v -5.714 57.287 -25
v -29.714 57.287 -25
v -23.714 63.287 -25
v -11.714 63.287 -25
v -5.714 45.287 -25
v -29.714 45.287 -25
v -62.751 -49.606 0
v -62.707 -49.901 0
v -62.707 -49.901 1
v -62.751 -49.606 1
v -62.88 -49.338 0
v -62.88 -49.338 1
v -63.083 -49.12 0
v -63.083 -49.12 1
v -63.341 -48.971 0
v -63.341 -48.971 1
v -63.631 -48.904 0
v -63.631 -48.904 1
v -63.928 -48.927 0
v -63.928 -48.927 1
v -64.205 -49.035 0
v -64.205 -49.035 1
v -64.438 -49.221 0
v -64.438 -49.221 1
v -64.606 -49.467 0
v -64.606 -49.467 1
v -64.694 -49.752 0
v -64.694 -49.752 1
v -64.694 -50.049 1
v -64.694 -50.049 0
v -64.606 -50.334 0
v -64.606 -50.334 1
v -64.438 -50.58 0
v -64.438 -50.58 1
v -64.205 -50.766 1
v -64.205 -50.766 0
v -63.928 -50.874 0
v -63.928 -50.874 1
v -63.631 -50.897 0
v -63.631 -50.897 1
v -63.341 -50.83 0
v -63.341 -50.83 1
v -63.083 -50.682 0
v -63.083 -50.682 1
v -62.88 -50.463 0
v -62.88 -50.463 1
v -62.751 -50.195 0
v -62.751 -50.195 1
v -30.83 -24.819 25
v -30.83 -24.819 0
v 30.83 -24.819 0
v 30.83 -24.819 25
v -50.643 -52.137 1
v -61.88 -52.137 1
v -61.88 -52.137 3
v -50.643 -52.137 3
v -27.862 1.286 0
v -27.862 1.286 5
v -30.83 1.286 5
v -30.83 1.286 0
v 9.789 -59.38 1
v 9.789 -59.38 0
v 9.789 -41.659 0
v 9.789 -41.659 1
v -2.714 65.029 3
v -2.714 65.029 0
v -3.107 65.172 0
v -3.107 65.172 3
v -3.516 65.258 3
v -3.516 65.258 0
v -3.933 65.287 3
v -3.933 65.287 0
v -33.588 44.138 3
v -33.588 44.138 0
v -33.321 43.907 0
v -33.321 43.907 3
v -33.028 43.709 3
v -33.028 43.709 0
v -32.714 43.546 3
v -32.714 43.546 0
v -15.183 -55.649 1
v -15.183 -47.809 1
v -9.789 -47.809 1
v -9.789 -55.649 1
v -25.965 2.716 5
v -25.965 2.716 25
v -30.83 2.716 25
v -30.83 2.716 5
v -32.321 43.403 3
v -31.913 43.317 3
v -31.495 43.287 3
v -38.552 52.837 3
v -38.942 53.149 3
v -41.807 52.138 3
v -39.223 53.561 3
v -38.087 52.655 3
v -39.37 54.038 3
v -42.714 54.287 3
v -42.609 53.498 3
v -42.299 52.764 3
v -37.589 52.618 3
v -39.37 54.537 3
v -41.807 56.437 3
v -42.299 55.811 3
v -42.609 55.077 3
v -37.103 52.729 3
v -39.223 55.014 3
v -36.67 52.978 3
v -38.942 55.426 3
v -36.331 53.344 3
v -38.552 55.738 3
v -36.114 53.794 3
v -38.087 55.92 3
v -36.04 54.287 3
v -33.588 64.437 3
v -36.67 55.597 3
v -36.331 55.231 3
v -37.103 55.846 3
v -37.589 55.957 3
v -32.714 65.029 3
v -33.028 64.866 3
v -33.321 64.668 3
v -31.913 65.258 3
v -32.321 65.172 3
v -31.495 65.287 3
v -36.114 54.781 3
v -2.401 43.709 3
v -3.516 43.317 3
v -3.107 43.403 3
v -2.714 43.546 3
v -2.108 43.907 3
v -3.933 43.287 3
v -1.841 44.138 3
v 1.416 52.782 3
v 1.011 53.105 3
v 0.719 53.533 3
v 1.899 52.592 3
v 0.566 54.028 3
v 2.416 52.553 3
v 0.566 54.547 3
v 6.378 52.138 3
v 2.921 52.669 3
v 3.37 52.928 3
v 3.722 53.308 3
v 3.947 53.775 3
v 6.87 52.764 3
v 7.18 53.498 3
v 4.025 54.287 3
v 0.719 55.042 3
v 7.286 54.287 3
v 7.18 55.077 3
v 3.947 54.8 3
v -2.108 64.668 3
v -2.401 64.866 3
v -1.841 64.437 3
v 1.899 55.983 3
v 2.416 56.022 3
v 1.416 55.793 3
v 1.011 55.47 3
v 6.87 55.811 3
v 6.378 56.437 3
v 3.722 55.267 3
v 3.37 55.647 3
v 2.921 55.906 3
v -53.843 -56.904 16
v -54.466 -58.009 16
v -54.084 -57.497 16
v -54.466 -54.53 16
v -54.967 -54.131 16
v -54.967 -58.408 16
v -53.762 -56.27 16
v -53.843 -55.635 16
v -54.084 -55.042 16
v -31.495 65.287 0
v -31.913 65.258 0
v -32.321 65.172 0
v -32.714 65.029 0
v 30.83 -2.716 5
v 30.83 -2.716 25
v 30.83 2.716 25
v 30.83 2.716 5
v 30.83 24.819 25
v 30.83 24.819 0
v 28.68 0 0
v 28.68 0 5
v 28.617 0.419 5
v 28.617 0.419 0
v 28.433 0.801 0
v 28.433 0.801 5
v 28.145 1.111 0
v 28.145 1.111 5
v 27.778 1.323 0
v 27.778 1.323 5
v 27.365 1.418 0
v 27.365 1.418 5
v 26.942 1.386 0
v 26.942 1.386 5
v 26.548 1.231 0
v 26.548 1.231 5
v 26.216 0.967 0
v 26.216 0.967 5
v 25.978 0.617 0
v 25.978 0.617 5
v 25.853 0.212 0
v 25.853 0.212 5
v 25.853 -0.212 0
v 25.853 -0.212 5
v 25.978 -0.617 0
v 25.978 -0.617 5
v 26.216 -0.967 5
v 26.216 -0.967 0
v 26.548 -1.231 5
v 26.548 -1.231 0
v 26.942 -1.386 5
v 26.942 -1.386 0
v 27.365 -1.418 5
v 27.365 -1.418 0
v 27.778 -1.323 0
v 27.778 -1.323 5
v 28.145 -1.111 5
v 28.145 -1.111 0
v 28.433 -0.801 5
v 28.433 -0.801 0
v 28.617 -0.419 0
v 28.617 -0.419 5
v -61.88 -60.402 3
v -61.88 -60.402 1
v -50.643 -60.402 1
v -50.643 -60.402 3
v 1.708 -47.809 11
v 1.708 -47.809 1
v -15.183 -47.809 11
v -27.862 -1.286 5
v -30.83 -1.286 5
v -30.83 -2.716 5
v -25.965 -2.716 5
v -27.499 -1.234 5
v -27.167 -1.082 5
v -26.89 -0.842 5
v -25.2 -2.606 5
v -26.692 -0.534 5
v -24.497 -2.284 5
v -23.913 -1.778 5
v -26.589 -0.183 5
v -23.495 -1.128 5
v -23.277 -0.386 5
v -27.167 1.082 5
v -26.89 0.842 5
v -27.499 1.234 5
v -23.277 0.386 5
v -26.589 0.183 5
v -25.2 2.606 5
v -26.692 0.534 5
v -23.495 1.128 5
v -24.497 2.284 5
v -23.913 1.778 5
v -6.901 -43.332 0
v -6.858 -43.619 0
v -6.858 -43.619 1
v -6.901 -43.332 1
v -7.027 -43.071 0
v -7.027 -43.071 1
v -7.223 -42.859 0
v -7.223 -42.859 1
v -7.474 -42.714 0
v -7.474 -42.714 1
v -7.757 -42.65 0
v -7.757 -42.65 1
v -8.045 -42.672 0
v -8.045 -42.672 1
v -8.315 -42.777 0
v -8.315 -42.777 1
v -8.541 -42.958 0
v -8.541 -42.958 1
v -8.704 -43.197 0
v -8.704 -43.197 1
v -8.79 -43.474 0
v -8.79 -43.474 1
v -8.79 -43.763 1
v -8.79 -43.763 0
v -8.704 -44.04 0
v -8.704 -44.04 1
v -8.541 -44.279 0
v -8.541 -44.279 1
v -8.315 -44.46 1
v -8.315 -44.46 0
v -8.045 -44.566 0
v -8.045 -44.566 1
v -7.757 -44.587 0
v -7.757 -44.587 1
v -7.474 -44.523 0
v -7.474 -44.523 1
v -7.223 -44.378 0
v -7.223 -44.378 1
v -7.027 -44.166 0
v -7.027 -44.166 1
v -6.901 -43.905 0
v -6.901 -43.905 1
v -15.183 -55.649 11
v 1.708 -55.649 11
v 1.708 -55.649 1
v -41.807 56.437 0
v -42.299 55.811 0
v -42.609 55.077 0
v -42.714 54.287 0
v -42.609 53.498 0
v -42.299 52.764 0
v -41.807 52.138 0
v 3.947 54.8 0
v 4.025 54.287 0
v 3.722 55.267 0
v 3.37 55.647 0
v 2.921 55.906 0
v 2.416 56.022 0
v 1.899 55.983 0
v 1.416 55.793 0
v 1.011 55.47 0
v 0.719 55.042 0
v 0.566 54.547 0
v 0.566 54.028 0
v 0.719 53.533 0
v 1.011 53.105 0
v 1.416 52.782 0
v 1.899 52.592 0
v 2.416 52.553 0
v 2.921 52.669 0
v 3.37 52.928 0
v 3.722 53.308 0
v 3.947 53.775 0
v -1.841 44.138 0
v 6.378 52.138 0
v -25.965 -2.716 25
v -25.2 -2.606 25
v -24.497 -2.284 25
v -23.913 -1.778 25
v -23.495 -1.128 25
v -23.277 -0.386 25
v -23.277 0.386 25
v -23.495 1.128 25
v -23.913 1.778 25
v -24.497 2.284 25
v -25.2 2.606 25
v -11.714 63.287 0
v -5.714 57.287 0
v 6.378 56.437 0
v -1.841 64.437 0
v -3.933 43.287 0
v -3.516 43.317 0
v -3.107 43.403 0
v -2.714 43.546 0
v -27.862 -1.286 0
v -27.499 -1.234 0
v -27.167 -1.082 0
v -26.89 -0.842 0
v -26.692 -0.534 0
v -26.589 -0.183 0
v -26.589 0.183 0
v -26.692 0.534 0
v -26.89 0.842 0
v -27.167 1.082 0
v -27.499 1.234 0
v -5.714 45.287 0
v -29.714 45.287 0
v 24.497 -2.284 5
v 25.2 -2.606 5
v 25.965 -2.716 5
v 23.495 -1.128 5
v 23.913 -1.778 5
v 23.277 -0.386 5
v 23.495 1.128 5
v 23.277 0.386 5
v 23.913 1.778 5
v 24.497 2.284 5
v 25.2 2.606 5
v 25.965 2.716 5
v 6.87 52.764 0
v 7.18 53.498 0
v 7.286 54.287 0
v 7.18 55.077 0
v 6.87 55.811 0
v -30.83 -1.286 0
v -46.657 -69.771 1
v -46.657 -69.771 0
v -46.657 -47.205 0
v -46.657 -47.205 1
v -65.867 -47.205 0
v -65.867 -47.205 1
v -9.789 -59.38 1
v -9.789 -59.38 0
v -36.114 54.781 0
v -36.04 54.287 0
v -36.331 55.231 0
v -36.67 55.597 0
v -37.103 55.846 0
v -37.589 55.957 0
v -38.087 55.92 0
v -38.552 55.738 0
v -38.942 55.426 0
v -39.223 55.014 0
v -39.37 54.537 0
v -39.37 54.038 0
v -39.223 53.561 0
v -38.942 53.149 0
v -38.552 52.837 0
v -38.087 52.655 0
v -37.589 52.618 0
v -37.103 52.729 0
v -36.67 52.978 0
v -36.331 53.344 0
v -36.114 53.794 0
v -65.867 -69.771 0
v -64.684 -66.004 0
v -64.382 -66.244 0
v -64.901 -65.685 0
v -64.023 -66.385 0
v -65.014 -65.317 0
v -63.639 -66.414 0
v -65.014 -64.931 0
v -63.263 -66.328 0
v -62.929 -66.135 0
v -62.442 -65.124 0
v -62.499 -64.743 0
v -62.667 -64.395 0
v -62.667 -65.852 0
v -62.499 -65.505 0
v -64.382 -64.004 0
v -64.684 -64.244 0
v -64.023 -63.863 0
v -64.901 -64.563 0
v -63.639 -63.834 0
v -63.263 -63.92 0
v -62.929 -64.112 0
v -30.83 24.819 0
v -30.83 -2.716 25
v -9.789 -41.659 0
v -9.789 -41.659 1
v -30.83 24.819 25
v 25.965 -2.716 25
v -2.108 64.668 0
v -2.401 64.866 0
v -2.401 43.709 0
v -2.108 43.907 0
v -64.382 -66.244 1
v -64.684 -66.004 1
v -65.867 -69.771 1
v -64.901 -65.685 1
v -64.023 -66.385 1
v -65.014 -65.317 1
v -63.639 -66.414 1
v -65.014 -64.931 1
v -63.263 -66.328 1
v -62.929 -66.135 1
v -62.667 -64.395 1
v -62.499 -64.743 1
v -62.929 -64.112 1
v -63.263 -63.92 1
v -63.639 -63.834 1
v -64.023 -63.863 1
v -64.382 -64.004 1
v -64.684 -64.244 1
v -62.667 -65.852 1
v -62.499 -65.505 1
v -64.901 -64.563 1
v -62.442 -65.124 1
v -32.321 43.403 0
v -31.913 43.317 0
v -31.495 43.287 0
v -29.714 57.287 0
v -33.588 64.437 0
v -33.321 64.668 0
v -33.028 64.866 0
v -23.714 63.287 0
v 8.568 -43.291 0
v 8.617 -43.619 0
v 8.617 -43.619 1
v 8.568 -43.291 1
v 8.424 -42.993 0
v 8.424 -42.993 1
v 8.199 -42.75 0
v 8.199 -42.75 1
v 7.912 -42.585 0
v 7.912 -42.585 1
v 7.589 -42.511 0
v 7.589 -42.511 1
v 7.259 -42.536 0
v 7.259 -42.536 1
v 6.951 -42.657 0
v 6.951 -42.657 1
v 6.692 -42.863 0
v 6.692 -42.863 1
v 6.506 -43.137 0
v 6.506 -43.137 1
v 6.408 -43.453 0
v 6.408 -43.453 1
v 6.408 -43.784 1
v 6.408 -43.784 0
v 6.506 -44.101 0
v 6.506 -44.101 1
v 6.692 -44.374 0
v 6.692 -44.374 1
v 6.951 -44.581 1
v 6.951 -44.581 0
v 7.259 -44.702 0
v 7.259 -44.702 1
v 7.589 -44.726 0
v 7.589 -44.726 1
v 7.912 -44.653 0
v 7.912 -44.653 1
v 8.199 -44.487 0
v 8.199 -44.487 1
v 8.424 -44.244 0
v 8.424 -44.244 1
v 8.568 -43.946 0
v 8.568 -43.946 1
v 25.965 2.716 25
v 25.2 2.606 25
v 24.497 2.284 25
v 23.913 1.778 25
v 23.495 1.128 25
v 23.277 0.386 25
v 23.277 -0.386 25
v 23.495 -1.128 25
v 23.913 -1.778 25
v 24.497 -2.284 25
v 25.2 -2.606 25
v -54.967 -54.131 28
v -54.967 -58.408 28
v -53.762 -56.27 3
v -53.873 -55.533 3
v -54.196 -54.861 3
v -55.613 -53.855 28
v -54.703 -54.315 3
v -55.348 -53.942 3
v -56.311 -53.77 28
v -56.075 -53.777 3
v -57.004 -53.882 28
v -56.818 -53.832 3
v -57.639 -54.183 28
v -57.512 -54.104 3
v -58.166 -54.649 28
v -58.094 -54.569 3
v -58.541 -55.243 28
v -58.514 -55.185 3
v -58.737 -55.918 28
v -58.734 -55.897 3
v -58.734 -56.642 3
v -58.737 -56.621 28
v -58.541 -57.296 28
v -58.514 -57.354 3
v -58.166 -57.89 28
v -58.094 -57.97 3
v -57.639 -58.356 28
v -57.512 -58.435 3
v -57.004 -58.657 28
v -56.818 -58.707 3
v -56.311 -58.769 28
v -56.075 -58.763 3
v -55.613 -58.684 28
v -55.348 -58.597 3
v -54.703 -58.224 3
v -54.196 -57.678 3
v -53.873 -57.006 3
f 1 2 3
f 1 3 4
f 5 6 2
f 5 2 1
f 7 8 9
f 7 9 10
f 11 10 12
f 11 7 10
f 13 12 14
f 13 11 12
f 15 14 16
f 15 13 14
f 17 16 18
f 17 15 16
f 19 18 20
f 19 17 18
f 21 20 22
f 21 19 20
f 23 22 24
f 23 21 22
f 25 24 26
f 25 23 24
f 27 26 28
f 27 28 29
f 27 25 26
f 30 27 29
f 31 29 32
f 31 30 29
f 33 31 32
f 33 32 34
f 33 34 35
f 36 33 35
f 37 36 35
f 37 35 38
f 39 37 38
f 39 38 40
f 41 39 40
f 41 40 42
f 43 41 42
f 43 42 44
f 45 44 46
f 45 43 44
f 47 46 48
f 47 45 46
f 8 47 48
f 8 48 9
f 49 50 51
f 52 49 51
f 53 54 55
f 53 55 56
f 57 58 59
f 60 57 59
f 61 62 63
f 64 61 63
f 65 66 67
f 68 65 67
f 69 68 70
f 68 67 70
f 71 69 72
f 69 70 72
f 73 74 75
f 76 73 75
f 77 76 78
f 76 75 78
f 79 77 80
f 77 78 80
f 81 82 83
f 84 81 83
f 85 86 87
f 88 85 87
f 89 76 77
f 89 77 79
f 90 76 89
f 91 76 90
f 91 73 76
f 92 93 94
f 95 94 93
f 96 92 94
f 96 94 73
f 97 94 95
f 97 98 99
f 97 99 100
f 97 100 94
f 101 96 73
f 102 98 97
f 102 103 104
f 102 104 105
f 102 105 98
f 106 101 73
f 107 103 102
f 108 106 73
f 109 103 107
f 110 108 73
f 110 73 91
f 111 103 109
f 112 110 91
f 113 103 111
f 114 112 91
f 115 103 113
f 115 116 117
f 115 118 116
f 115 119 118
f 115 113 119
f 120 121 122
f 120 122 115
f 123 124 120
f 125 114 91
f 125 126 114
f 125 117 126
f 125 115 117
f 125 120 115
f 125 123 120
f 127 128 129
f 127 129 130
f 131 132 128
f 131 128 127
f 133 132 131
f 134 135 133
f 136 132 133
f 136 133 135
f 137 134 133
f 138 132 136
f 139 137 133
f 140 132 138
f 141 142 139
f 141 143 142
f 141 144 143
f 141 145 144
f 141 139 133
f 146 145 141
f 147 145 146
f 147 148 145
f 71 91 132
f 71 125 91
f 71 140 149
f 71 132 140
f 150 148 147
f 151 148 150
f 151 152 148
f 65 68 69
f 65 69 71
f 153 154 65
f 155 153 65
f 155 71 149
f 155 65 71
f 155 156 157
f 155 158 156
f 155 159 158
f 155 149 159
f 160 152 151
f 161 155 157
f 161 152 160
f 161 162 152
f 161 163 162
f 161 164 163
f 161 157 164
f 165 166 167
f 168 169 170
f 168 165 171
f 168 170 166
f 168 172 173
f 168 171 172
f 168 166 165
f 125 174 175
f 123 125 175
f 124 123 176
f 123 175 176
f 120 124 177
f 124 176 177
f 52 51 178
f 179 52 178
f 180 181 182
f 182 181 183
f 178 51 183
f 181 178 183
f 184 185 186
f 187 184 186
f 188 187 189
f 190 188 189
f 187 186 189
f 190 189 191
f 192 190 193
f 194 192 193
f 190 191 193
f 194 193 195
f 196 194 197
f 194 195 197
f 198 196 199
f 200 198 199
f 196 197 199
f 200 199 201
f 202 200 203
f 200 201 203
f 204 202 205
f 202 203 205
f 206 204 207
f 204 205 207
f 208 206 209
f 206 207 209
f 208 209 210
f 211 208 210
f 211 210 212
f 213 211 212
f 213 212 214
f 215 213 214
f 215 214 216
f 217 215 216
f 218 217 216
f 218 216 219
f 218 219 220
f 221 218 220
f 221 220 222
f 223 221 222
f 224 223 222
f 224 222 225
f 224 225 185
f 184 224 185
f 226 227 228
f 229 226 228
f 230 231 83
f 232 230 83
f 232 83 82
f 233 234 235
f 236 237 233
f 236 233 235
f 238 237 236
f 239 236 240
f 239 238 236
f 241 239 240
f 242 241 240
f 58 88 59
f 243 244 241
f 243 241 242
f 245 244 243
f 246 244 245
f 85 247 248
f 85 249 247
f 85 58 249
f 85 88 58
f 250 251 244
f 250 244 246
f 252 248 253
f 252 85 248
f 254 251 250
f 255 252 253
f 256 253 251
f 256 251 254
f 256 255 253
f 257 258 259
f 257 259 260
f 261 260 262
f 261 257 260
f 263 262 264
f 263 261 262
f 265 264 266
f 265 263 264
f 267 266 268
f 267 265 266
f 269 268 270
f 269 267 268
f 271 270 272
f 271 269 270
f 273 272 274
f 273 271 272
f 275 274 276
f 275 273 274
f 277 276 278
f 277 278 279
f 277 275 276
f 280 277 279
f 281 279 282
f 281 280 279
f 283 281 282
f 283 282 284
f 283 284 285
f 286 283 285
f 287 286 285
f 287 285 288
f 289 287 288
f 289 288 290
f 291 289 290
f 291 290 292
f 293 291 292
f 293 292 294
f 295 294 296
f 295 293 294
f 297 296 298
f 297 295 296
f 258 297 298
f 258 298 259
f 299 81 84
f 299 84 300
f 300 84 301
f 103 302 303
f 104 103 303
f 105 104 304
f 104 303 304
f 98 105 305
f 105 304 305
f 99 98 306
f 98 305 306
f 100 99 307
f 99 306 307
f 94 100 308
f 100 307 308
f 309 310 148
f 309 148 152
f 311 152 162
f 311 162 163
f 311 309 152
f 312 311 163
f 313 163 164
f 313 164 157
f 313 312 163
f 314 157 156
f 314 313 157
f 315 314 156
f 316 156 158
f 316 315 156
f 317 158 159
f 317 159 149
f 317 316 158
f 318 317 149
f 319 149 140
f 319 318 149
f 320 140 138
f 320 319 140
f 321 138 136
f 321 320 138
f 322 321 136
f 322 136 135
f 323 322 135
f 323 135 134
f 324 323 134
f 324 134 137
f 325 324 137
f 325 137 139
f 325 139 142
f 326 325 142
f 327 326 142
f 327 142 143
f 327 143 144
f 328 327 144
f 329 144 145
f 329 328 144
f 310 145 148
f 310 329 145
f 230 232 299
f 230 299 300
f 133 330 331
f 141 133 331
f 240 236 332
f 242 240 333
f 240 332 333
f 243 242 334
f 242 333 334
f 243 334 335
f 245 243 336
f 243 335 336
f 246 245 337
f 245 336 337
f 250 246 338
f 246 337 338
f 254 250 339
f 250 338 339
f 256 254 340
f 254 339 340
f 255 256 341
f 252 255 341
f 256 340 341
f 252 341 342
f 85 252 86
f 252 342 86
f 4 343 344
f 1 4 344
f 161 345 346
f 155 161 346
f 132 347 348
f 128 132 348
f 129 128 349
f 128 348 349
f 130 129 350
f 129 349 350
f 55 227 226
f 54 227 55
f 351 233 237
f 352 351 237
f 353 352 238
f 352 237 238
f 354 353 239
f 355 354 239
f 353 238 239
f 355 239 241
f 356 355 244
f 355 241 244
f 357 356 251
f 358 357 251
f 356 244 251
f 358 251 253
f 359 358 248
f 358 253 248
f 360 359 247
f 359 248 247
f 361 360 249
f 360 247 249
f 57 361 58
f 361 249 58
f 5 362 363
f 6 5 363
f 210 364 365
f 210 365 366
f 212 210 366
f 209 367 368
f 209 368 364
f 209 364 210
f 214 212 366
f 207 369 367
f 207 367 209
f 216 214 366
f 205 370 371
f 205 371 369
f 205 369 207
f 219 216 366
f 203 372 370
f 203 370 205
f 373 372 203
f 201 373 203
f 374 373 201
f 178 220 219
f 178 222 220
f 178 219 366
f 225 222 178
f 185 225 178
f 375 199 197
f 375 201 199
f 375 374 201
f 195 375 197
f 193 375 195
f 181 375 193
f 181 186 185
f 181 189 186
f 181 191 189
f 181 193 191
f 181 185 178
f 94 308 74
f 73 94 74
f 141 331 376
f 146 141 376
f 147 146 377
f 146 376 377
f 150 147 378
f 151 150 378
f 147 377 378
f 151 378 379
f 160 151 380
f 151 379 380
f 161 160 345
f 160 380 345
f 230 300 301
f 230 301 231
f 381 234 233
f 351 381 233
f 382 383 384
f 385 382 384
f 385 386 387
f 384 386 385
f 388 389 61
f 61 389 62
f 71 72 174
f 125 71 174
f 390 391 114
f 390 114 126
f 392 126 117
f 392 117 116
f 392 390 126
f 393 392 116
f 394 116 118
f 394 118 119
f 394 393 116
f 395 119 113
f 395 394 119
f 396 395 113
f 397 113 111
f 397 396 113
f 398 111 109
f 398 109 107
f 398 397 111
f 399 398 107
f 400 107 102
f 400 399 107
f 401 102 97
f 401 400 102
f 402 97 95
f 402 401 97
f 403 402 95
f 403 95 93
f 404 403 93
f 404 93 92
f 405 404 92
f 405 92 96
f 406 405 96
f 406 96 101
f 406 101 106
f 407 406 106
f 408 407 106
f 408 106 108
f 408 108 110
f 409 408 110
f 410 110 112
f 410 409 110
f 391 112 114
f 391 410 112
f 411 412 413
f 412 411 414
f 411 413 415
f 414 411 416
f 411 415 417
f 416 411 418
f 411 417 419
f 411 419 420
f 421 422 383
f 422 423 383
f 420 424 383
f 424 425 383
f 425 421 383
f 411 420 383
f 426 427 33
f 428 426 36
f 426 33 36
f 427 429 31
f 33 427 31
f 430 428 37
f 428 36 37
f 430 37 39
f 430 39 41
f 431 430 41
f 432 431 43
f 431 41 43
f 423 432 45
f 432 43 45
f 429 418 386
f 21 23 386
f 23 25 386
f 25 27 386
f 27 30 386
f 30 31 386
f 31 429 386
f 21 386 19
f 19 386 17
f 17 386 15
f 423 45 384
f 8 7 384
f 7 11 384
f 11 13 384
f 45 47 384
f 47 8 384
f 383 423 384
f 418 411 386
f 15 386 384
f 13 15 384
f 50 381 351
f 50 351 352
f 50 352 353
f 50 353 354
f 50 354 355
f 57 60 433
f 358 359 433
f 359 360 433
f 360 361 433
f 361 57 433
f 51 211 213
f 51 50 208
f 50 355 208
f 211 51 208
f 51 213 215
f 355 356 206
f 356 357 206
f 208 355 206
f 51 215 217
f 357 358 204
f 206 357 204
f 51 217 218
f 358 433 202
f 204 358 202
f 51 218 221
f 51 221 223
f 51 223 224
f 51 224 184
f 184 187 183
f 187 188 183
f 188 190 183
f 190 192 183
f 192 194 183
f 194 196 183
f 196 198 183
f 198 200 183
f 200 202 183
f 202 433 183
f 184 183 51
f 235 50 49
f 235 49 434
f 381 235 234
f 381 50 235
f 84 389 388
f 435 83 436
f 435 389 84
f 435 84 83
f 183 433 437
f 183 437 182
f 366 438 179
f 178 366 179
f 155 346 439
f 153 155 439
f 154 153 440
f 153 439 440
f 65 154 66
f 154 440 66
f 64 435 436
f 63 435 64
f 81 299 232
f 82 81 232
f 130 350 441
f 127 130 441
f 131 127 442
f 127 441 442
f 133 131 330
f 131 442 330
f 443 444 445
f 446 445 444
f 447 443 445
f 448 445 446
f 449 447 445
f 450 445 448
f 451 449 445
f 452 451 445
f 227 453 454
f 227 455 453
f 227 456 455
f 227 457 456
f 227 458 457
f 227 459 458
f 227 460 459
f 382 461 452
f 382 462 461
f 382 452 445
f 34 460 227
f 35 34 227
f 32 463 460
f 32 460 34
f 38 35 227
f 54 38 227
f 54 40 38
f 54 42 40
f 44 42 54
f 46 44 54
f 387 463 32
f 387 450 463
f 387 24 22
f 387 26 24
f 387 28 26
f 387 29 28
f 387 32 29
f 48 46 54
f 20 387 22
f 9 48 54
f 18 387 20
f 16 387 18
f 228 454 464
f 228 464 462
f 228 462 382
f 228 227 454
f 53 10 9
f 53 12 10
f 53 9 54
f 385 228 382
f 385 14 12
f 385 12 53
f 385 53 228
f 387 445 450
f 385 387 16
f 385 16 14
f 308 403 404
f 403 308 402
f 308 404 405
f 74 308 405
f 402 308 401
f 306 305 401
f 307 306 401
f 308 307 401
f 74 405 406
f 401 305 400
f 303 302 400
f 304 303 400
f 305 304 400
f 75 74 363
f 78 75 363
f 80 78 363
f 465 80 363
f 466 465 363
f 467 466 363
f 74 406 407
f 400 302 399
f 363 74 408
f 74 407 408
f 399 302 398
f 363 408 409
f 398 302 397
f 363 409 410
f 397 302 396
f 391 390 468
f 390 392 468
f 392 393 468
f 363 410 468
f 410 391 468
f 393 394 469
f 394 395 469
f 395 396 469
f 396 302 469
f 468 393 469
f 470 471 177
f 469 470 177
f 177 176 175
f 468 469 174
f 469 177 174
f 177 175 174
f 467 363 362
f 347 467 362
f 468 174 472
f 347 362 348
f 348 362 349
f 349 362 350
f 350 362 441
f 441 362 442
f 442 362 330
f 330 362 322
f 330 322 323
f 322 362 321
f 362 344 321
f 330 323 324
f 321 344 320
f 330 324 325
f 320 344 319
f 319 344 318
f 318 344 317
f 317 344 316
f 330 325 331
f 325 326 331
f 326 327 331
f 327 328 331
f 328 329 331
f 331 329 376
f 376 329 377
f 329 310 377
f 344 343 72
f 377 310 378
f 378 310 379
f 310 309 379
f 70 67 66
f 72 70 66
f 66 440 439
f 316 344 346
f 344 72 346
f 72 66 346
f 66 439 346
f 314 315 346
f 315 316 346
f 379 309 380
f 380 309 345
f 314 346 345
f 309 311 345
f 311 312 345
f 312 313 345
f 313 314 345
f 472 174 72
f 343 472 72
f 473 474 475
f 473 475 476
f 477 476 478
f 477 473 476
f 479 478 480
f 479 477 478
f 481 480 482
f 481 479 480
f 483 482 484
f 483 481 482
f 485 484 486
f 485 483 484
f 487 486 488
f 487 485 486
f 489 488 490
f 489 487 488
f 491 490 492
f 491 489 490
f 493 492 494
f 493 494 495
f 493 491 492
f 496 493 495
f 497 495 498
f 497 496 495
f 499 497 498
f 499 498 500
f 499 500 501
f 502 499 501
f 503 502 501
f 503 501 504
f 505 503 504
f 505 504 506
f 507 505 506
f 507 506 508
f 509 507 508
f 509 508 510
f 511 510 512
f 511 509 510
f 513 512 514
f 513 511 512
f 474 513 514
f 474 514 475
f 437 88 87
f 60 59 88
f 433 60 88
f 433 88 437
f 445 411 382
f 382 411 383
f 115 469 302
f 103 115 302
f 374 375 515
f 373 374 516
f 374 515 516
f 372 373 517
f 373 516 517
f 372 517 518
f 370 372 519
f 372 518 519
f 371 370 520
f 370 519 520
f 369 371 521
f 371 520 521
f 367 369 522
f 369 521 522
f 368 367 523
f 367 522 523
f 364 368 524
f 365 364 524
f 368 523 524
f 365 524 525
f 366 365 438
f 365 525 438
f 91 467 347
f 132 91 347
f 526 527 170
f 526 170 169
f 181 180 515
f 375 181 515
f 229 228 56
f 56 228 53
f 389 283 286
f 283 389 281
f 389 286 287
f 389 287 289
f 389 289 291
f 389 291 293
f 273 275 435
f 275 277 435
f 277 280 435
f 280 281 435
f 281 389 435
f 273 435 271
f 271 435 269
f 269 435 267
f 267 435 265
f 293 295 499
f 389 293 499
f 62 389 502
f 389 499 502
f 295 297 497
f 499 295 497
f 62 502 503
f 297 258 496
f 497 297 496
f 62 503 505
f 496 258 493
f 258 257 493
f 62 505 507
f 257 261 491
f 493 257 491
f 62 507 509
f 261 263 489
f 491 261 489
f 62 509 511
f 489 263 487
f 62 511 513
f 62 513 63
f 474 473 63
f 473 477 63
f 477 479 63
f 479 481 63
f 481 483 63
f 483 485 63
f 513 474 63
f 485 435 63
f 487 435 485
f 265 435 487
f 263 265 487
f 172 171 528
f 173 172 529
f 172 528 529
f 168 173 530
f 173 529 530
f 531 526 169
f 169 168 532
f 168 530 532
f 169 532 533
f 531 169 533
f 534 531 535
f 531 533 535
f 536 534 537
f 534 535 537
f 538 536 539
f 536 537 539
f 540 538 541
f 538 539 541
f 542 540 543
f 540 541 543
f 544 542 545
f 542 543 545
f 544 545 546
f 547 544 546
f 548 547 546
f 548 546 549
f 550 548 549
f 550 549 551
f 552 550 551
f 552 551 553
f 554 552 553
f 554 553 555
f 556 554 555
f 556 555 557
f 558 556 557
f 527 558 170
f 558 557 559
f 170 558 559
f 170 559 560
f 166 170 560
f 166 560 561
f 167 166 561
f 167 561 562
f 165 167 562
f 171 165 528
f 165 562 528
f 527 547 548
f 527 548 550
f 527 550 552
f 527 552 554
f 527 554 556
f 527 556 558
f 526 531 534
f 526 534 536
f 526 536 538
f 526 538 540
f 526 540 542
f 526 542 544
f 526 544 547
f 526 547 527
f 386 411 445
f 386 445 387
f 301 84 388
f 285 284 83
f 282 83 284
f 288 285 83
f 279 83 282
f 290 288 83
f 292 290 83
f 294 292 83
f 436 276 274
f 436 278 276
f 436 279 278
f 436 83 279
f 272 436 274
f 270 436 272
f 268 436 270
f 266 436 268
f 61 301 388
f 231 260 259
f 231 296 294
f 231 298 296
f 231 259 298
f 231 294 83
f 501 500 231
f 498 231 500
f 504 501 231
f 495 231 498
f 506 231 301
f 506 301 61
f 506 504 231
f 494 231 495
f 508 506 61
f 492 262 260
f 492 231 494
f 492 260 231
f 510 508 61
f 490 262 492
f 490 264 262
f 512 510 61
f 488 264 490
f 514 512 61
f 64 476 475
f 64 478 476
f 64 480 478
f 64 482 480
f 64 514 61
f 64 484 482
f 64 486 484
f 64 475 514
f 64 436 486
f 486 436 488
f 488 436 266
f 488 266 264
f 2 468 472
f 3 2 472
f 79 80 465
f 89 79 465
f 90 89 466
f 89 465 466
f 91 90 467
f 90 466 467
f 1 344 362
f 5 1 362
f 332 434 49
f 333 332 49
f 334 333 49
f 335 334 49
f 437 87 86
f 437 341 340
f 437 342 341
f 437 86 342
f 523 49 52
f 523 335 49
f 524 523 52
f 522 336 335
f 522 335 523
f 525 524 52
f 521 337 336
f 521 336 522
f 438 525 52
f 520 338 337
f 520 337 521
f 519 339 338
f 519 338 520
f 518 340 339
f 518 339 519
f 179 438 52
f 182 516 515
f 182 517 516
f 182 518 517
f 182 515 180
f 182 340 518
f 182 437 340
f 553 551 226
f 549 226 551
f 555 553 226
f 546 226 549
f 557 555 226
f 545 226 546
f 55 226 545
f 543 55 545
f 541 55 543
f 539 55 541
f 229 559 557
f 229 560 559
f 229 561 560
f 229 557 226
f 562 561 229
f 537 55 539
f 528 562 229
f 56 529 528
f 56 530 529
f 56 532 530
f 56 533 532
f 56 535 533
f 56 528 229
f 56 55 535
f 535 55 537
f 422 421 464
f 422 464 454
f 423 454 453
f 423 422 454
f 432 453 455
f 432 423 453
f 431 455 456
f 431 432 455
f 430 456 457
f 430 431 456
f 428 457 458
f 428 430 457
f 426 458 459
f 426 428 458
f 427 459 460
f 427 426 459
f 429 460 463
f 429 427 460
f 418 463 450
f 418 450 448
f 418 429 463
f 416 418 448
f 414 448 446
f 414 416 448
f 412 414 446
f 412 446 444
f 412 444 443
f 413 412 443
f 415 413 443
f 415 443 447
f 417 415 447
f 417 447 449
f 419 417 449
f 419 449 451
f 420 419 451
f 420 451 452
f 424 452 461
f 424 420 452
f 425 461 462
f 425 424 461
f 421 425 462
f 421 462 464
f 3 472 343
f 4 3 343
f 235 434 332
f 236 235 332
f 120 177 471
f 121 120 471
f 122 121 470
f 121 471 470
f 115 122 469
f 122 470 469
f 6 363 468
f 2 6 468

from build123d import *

# Parameters (mm, degrees)
F0_W      = 61.659202
F0_H      = 49.637978
F1_DEPTH  = 25
F3_DEPTH  = 20
F4_R      = 1.421649
F5_DEPTH  = 25
F6_W      = 19.577416
F6_H      = 17.721154
F6_R      = 0.971405
F6_R_2    = 1.110846
F7_DEPTH  = 1
F8_W      = 5.394709
F8_H      = 7.840492
F8_W_2    = 11.496354
F9_DEPTH  = 10
F10_W     = 19.209724
F10_H     = 22.565868
F10_R     = 1.29352
F10_R_2   = 0.998938
F11_DEPTH = 1
F12_W     = 11.237443
F12_H     = 8.265712
F13_DEPTH = 3
F14_R     = 2.5
F15_DEPTH = 25
F16_W     = 2.265696
F16_H     = 6.188683
F17_DEPTH = 12
F18_R     = 1.674399
F18_R_2   = 1.738958
F19_DEPTH = 3
F21_DEPTH = 25


with BuildPart() as f1:
    # F0 (on Top) → F1 (new body)
    with BuildSketch(Plane.XY):
        Rectangle(F0_W, F0_H)
    extrude(amount=F1_DEPTH)

    # F2 (on face) → F3 (cut)
    with BuildSketch(Plane.XY.offset(25)):
        with BuildLine():
            Line((-48.539023, -2.715533), (-25.964985, -2.715533))
            ThreePointArc((-25.964985, -2.715533), (-23.249452, 0), (-25.964985, 2.715533))
            Line((-25.964985, 2.715533), (-48.539023, 2.715533))
            Line((-48.539023, 2.715533), (-48.539023, -2.715533))
        make_face()
        with BuildLine():
            Line((48.539023, -2.715533), (48.539023, 2.715533))
            Line((48.539023, 2.715533), (25.964985, 2.715533))
            ThreePointArc((25.964985, 2.715533), (23.249452, 0), (25.964985, -2.715533))
            Line((25.964985, -2.715533), (48.539023, -2.715533))
        make_face()
    extrude(amount=-F3_DEPTH, mode=Mode.SUBTRACT)

    # F4 (on face) → F5 (cut)
    with BuildSketch(Plane.XY.offset(5)):
        with BuildLine():
            Line((-35.779416, -1.28587), (-27.861754, -1.28587))
            ThreePointArc((-27.861754, -1.28587), (-26.575883, 0), (-27.861754, 1.28587))
            Line((-27.861754, 1.28587), (-35.779416, 1.28587))
            Line((-35.779416, 1.28587), (-35.779416, -1.28587))
        make_face()
        with Locations((27.258597, 0)):
            Circle(F4_R)
    extrude(amount=-F5_DEPTH, mode=Mode.SUBTRACT)


with BuildPart() as f7:
    # F6 (on Top) → F7 (new body)
    with BuildSketch(Plane.XY):
        with Locations((0, -50.51963)):
            Rectangle(F6_W, F6_H)
        with Locations((-7.829157, -43.618601)):
            Circle(F6_R, mode=Mode.SUBTRACT)
        with Locations((7.506458, -43.618601)):
            Circle(F6_R_2, mode=Mode.SUBTRACT)
    extrude(amount=F7_DEPTH)

    # F8 (on face) → F9 (join)
    with BuildSketch(Plane.XY.offset(1)):
        with Locations((-12.486062, -51.728945)):
            Rectangle(F8_W, F8_H)
        with Locations((-4.040531, -51.728945)):
            Rectangle(F8_W_2, F8_H)
    extrude(amount=F9_DEPTH)


with BuildPart() as f11:
    # F10 (on Top) → F11 (new body)
    with BuildSketch(Plane.XY):
        with Locations((-56.261646, -58.487864)):
            Rectangle(F10_W, F10_H)
        with Locations((-63.735321, -65.123782)):
            Circle(F10_R, mode=Mode.SUBTRACT)
        with Locations((-63.705809, -49.900506)):
            Circle(F10_R_2, mode=Mode.SUBTRACT)
    extrude(amount=F11_DEPTH)

    # F12 (on Top) → F13 (join)
    with BuildSketch(Plane.XY):
        with Locations((-56.261646, -56.269545)):
            Rectangle(F12_W, F12_H)
    extrude(amount=F13_DEPTH)

    # F14 (on face) → F15 (join)
    with BuildSketch(Plane.XY.offset(3)):
        with Locations((-56.261646, -56.269545)):
            Circle(F14_R)
    extrude(amount=F15_DEPTH)

    # F16 (on face) → F17 (cut)
    with BuildSketch(Plane.XY.offset(28)):
        with Locations((-53.833885, -56.285686)):
            Rectangle(F16_W, F16_H)
    extrude(amount=-F17_DEPTH, mode=Mode.SUBTRACT)


with BuildPart() as f19:
    # F18 (on Top) → F19 (new body)
    with BuildSketch(Plane.XY):
        with BuildLine():
            Line((-31.49543, 43.287491), (-3.933392, 43.287491))
            ThreePointArc((-3.933392, 43.287491), (-3.310314, 43.352909), (-2.714411, 43.546308))
            ThreePointArc((-2.714411, 43.546308), (-2.251458, 43.803322), (-1.840903, 44.137726))
            Line((-1.840903, 44.137726), (6.378078, 52.137726))
            ThreePointArc((6.378078, 52.137726), (7.285589, 54.287491), (6.378078, 56.437257))
            Line((6.378078, 56.437257), (-1.840903, 64.437257))
            ThreePointArc((-1.840903, 64.437257), (-2.251458, 64.771661), (-2.714411, 65.028674))
            ThreePointArc((-2.714411, 65.028674), (-3.310314, 65.222074), (-3.933392, 65.287491))
            Line((-3.933392, 65.287491), (-31.49543, 65.287491))
            ThreePointArc((-31.49543, 65.287491), (-32.118507, 65.222074), (-32.714411, 65.028674))
            ThreePointArc((-32.714411, 65.028674), (-33.177363, 64.771661), (-33.587918, 64.437257))
            Line((-33.587918, 64.437257), (-41.806899, 56.437257))
            ThreePointArc((-41.806899, 56.437257), (-42.714411, 54.287491), (-41.806899, 52.137726))
            Line((-41.806899, 52.137726), (-33.587918, 44.137726))
            ThreePointArc((-33.587918, 44.137726), (-33.177363, 43.803322), (-32.714411, 43.546308))
            ThreePointArc((-32.714411, 43.546308), (-32.118507, 43.352909), (-31.49543, 43.287491))
        make_face()
        with Locations((-37.714411, 54.287491)):
            Circle(F18_R, mode=Mode.SUBTRACT)
        with Locations((2.285589, 54.287491)):
            Circle(F18_R_2, mode=Mode.SUBTRACT)
    extrude(amount=F19_DEPTH)

    # F20 (on face) → F21 (join)
    with BuildSketch(Plane(origin=(0, 0, 0), x_dir=(1, 0, 0), z_dir=(0, 0, -1))):
        Polygon((-5.714411, -45.287491), (-17.714411, -45.287491), (-29.714411, -45.287491), (-29.714411, -57.287491), (-23.714411, -63.287491), (-17.714411, -63.287491), (-11.714411, -63.287491), (-5.714411, -57.287491), align=None)
    extrude(amount=F21_DEPTH)


solid = Compound([f1.part, f7.part, f11.part, f19.part])
